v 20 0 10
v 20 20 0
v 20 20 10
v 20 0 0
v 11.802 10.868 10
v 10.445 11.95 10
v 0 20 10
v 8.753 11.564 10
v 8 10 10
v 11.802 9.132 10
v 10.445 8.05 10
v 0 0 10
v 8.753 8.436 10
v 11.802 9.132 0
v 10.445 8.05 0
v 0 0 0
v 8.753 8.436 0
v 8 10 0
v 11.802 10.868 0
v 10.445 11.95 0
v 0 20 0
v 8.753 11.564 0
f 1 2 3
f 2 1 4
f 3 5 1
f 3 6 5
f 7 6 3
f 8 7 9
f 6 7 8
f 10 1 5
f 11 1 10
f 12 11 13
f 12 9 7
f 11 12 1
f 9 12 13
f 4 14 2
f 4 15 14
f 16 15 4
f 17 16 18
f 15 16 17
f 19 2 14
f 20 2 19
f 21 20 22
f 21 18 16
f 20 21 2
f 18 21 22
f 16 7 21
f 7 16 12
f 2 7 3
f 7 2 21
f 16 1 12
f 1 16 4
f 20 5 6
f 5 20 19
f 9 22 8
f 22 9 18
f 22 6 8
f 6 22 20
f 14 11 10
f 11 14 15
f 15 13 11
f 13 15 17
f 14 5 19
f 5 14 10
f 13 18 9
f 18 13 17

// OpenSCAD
width=20;
// @PROVENANCE@
module smx_insert_item_1() {
cylinder(d = 4, h = 12, center = false);
}
difference() {
    union() {
cube([width,20,10]);
    }
    // Fixed local placement.
    multmatrix([[-1, 0, 0, 10], [0, 1, 0, 10], [0, 0, -1, 10], [0, 0, 0, 1]])
        smx_insert_item_1();
}
